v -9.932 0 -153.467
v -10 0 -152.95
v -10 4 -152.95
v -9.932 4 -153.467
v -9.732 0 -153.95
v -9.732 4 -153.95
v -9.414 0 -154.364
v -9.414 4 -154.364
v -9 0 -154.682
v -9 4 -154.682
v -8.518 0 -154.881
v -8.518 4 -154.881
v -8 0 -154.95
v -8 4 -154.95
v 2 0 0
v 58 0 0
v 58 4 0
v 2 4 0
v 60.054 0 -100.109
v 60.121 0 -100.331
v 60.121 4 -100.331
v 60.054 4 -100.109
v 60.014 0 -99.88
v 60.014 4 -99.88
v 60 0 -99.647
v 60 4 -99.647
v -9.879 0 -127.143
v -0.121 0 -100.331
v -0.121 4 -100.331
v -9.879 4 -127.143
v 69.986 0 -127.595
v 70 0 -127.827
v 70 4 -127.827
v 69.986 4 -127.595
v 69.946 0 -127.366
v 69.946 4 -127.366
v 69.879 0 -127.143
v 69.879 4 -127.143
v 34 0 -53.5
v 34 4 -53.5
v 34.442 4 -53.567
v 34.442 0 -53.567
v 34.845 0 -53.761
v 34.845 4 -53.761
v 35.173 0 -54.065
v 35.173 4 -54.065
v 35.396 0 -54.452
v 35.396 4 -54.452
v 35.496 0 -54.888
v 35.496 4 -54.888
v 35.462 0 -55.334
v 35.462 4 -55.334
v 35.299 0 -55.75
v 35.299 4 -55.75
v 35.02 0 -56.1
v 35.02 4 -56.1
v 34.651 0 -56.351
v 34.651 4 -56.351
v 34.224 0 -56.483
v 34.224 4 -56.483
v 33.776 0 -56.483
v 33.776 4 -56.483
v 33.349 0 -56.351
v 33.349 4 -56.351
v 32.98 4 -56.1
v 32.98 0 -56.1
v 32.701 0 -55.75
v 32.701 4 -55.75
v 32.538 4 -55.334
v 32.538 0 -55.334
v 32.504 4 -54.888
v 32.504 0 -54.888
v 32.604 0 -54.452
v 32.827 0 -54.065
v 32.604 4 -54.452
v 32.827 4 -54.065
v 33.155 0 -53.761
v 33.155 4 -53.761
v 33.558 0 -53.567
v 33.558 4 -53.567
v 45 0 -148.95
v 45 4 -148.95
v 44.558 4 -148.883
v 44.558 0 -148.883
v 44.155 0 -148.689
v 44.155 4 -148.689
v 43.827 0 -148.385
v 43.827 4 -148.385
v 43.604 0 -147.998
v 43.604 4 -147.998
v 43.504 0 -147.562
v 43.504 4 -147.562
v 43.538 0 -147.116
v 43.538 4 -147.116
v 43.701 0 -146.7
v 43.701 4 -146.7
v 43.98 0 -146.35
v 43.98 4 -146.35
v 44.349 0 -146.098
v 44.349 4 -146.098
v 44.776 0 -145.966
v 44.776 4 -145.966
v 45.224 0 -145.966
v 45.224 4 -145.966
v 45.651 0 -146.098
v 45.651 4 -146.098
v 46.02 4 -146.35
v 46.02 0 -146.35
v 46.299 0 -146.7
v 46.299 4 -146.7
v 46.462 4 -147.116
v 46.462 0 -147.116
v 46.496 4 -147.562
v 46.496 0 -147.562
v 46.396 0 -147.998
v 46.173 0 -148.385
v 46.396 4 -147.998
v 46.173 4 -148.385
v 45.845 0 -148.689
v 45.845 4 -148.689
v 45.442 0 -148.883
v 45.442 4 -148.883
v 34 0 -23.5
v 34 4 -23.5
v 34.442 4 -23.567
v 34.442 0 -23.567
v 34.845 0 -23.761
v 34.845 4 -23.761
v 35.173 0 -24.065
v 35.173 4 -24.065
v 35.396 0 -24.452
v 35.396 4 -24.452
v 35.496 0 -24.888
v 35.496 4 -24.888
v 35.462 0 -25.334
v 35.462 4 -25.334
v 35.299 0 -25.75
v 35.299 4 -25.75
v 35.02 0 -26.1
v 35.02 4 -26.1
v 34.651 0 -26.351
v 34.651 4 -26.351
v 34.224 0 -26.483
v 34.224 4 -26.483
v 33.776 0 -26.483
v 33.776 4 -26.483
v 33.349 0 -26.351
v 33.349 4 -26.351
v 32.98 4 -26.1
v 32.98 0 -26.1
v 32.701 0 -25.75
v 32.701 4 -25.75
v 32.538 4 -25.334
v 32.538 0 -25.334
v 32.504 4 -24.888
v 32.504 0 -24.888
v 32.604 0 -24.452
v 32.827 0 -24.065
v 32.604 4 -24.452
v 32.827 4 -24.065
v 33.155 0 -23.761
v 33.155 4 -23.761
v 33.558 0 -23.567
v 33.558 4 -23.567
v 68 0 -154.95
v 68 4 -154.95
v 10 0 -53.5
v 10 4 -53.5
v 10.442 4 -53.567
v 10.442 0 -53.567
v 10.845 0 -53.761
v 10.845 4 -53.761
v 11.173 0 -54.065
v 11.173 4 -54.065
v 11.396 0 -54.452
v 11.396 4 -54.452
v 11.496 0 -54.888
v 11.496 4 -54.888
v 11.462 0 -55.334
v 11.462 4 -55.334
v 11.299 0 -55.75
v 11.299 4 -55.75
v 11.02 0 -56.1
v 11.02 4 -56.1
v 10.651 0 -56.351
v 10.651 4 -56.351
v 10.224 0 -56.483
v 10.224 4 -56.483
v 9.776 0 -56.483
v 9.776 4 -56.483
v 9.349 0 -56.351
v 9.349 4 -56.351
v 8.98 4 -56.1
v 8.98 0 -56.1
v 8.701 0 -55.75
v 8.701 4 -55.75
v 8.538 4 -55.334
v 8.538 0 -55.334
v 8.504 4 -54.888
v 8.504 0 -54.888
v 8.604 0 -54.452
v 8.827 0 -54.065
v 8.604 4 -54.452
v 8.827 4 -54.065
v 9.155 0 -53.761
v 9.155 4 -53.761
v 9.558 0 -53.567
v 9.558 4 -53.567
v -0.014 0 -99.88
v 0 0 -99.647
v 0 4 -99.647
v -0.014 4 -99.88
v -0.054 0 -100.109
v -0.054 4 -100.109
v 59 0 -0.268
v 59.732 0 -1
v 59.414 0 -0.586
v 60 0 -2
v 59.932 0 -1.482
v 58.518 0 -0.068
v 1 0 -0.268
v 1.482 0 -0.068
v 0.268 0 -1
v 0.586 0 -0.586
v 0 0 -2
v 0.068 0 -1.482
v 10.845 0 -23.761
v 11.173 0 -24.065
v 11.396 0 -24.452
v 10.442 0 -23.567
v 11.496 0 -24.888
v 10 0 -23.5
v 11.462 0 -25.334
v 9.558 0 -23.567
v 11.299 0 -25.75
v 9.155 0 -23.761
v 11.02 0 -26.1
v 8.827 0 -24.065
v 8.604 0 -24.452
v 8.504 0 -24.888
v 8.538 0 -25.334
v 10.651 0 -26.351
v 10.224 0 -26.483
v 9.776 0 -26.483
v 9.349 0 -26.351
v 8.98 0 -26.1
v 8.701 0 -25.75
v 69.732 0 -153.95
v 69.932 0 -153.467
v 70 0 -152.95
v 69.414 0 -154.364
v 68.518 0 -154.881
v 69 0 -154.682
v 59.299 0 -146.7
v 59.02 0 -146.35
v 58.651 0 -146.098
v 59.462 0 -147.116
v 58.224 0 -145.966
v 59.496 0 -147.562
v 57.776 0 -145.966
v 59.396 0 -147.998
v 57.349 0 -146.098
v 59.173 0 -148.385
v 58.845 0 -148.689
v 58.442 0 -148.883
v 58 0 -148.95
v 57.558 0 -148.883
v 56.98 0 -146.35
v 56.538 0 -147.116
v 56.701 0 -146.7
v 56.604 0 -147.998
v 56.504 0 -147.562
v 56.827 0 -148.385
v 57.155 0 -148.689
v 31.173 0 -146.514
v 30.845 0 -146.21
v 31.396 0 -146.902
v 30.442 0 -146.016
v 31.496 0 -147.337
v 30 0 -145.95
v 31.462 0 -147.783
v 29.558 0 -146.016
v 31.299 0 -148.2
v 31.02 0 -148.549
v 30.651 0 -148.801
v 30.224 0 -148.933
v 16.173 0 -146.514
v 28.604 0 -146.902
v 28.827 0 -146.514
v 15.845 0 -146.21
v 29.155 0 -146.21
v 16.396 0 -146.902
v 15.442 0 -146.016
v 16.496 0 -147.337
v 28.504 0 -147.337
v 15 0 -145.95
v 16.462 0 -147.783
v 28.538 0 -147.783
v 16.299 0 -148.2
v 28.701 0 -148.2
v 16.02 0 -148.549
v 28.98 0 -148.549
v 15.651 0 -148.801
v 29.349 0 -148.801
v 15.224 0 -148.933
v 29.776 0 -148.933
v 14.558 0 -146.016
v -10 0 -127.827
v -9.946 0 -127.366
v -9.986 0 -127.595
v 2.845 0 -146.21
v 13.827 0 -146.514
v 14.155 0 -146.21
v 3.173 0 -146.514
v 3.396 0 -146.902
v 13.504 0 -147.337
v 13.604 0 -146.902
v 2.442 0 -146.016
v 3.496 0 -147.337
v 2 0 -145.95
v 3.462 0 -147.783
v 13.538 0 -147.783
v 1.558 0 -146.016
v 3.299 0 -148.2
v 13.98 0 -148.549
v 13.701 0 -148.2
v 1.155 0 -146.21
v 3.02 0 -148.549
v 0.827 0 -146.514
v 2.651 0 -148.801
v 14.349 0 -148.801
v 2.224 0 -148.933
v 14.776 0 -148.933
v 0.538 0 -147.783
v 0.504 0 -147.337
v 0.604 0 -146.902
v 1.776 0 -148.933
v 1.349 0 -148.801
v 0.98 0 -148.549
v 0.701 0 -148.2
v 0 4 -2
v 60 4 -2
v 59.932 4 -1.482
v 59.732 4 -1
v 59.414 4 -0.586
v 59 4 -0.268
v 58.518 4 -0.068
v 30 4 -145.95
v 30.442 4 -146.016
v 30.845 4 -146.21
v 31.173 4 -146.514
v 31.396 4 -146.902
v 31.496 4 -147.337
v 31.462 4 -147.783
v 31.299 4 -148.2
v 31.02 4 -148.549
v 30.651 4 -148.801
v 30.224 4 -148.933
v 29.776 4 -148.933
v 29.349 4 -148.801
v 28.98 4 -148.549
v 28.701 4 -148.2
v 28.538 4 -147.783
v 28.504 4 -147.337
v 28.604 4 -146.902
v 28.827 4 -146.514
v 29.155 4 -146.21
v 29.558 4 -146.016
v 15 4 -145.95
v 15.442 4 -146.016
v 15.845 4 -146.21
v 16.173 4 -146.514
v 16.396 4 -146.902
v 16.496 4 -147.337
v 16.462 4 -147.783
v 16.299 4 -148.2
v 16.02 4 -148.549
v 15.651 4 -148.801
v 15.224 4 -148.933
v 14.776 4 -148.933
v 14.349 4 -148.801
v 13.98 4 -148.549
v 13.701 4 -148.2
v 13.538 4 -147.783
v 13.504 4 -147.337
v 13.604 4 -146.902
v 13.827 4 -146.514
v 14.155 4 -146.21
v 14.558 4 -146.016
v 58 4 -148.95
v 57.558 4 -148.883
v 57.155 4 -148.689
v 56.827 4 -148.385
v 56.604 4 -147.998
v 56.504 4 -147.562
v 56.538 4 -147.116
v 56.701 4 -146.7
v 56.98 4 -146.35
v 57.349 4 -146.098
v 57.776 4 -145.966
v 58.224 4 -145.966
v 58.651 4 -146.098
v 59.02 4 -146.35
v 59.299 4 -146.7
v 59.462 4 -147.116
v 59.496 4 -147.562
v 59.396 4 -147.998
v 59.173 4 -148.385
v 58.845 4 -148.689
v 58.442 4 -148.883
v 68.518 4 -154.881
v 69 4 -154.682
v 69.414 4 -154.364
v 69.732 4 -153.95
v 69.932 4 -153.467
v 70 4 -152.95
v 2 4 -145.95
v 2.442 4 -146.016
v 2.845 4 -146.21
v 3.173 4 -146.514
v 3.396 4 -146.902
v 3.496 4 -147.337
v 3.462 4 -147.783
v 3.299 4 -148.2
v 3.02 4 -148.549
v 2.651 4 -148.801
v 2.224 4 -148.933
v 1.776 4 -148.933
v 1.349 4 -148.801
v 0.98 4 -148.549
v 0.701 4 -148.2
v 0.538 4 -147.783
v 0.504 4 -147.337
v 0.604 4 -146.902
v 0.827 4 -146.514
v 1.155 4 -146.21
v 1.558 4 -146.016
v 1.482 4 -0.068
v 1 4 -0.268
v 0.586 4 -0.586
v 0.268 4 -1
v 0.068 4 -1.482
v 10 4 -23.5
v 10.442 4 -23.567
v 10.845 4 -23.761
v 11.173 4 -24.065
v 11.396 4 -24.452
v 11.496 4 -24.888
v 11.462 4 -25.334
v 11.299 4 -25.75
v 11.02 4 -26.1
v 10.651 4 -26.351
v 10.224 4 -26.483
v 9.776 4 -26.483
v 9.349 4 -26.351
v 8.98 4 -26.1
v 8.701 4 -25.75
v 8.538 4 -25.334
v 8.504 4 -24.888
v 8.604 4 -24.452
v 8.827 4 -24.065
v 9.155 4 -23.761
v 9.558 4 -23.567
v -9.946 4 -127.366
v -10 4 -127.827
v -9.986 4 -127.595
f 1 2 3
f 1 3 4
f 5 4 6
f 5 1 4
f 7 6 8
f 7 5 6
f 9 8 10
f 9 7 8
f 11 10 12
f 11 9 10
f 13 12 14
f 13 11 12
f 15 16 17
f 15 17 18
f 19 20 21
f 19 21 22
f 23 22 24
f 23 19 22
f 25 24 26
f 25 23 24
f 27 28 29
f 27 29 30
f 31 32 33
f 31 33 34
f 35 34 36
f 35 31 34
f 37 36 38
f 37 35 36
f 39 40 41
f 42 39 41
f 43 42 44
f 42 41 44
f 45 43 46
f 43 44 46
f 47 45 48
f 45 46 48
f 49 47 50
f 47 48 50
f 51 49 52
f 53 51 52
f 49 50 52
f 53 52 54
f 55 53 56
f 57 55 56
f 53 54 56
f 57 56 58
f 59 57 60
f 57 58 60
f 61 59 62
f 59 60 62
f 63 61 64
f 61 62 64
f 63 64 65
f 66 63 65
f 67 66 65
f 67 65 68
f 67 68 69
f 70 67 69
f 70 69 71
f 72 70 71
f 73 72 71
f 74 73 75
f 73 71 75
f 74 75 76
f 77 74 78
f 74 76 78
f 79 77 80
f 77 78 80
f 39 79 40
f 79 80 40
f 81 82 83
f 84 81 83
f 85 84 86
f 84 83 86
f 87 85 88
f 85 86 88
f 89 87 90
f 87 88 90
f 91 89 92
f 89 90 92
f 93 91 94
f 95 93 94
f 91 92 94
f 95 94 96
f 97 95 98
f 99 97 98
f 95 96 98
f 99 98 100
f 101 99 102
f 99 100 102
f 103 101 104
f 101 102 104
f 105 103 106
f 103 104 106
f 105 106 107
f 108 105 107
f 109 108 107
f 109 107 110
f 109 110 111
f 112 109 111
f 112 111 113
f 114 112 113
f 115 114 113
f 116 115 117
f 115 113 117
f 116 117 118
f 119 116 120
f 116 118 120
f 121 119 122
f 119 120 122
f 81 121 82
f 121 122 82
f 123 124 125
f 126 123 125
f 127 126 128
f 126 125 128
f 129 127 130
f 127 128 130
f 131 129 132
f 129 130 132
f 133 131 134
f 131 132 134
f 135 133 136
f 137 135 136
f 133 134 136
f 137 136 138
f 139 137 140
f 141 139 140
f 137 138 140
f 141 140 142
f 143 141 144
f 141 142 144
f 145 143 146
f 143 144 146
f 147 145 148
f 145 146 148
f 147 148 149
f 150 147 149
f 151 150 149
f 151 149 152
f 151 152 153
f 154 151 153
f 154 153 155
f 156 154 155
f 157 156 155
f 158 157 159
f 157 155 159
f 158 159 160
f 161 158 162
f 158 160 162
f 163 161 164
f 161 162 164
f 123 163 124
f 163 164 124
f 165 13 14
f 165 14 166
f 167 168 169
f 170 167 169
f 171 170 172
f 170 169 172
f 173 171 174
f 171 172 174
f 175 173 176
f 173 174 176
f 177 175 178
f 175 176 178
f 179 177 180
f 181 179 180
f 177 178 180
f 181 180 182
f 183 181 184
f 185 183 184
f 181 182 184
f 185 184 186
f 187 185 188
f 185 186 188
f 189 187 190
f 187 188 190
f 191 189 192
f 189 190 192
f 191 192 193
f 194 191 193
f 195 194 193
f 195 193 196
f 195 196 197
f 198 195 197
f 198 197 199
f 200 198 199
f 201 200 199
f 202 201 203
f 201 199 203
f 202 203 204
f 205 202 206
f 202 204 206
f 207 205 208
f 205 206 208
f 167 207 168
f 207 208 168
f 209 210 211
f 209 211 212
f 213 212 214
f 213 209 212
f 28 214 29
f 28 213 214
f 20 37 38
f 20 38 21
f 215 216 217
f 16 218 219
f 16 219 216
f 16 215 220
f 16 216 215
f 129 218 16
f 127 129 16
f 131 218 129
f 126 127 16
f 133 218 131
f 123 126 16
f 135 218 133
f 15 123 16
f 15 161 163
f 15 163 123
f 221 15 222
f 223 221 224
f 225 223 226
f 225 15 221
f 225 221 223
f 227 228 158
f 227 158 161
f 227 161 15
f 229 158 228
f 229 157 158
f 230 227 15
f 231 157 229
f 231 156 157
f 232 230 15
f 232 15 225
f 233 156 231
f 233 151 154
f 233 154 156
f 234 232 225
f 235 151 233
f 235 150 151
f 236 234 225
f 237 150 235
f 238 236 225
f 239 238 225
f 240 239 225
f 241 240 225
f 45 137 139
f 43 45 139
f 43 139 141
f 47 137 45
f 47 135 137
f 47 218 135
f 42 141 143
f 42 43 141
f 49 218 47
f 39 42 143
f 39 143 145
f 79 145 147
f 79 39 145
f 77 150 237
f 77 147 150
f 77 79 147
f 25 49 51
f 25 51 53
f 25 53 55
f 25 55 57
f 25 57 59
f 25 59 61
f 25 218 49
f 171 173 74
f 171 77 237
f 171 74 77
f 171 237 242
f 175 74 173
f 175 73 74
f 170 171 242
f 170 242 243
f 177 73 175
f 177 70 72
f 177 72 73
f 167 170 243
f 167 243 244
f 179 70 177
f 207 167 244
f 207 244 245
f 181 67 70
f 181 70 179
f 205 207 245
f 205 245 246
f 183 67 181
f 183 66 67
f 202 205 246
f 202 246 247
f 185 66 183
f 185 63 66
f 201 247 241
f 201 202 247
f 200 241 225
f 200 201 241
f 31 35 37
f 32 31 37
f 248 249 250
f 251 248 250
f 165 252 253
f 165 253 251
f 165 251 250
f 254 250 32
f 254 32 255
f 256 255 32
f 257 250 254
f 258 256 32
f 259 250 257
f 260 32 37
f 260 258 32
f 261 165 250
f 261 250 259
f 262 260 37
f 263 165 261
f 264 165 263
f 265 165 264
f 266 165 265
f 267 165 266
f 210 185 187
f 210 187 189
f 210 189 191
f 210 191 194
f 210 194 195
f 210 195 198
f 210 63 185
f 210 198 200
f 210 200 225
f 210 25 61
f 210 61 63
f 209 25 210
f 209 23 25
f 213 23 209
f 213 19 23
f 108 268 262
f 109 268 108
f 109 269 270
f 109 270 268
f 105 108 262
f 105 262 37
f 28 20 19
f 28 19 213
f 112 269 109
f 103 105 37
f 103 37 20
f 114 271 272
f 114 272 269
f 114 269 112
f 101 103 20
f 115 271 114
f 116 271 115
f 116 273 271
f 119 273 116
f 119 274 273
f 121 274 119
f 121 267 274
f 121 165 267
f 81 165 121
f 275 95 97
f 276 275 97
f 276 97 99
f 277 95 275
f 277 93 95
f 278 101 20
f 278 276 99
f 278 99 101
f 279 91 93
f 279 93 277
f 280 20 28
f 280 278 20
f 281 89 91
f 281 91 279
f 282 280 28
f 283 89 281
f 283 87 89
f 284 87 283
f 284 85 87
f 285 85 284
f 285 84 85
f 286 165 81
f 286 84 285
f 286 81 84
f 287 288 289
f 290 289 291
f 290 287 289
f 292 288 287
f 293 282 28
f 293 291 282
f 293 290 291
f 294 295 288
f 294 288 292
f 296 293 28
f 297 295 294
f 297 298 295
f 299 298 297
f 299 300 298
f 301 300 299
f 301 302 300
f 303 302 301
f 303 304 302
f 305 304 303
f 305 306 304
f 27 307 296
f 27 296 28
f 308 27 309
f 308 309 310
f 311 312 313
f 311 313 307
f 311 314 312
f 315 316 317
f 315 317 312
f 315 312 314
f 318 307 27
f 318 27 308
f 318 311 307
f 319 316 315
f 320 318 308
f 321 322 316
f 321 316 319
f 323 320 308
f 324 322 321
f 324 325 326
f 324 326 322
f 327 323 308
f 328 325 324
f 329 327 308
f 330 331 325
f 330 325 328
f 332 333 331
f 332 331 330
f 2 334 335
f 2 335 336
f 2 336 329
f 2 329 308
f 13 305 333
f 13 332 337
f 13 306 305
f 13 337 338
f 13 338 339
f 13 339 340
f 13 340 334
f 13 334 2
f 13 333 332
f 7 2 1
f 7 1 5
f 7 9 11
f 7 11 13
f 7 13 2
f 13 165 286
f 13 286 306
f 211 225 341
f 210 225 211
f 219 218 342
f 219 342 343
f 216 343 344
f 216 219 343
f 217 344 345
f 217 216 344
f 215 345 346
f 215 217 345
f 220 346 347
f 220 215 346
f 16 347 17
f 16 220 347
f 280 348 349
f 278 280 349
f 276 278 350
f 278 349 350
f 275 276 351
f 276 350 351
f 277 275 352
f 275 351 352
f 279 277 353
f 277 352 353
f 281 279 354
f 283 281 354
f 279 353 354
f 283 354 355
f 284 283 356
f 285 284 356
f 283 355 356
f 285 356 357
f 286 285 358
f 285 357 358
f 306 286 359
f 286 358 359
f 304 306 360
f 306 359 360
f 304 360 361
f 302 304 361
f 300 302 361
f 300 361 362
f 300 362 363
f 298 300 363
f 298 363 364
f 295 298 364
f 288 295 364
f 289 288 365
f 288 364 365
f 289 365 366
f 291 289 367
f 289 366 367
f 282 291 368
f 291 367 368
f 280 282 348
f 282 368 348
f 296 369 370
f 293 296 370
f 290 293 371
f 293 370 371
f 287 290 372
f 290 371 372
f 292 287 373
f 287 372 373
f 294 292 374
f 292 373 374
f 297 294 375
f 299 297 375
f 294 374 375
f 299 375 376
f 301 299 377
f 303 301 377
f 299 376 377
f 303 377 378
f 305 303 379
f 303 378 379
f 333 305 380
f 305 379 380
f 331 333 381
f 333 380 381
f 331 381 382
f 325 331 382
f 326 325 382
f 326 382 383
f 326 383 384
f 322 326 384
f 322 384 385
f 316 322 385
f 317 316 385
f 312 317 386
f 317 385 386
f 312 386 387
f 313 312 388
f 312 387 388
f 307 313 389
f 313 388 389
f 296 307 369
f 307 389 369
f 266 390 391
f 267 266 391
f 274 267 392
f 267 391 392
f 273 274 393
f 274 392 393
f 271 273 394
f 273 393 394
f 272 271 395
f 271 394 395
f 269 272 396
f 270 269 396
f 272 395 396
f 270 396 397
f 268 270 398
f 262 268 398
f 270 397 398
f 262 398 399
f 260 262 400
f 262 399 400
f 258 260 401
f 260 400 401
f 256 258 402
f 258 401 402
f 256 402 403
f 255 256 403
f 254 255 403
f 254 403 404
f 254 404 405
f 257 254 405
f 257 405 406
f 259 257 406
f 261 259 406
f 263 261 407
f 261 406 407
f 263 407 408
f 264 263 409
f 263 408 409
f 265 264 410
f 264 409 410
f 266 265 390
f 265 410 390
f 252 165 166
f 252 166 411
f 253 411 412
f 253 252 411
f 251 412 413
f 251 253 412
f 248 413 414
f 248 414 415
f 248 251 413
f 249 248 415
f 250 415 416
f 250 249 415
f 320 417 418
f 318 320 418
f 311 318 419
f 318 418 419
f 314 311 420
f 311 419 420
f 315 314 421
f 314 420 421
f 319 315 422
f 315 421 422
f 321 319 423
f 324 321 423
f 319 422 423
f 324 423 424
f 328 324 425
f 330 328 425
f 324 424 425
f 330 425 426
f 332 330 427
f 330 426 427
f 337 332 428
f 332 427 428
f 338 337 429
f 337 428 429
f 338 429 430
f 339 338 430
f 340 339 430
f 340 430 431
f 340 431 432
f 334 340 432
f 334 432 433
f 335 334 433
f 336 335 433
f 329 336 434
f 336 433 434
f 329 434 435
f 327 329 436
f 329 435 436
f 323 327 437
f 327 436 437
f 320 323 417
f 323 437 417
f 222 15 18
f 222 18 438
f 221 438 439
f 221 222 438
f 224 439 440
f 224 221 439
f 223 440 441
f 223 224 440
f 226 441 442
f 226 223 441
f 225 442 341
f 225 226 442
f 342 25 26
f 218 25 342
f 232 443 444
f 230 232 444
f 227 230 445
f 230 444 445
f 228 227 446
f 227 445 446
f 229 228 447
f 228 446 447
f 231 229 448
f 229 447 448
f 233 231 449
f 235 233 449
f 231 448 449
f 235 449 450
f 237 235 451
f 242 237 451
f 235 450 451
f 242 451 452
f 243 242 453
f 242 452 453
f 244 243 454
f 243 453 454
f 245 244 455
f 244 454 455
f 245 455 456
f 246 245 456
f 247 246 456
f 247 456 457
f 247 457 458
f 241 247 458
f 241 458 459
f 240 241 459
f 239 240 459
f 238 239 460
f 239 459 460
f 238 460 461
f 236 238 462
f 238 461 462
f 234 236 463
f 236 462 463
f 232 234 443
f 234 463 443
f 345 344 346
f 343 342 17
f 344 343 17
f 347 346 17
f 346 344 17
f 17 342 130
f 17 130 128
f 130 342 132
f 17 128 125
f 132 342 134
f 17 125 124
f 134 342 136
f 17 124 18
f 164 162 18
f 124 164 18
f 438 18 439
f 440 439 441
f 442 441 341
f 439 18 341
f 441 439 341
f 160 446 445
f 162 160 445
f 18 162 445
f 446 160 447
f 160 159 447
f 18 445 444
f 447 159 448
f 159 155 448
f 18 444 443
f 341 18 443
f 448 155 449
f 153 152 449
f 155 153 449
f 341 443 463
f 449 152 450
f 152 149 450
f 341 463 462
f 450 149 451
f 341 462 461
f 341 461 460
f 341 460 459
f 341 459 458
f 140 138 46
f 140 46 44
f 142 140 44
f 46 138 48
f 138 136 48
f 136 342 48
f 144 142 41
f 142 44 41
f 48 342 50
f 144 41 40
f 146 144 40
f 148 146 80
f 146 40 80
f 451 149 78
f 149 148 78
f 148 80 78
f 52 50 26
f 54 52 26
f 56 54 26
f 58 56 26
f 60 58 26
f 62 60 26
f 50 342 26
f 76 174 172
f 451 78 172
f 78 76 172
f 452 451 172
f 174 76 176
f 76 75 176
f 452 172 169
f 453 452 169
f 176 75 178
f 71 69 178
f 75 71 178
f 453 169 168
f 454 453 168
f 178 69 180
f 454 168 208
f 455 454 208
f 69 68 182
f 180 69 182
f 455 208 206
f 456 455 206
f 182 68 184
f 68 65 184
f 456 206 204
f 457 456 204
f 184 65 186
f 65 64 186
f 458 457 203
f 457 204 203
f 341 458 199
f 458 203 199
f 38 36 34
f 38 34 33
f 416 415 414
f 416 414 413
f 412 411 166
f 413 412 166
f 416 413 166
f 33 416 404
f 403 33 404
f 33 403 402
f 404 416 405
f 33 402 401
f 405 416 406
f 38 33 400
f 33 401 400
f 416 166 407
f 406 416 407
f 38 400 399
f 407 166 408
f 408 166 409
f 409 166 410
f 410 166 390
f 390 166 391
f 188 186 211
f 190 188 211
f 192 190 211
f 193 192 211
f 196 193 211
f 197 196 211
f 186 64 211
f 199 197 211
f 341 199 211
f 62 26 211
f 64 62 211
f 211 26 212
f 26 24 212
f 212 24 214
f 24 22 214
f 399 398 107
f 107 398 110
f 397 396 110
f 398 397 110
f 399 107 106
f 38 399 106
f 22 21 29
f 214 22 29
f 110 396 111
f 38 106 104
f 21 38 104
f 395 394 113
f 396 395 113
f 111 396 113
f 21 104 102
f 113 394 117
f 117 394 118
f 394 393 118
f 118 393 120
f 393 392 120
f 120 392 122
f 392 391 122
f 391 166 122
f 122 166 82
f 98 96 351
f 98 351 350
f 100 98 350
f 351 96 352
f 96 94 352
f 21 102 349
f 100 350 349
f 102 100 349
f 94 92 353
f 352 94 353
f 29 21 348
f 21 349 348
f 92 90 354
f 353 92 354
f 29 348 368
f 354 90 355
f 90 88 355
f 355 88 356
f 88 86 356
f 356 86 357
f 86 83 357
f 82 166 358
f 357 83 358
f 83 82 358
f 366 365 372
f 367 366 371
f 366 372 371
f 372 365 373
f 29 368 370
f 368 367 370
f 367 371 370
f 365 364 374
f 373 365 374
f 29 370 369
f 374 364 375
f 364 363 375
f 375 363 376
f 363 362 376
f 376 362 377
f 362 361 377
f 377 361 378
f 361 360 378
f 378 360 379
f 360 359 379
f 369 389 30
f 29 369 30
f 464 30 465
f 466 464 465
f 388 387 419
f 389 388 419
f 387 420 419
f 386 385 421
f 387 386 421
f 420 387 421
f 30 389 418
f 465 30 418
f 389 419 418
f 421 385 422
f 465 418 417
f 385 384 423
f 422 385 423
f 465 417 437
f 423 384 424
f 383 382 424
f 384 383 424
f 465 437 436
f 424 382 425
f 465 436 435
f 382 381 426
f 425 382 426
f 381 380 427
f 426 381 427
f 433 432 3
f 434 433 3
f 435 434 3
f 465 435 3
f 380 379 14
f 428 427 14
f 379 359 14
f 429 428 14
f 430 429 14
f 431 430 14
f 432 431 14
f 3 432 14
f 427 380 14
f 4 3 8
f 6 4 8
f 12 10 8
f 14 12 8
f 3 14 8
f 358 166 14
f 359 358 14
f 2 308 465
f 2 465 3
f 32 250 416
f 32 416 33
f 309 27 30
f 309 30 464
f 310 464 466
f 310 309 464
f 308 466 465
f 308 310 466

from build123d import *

# Parameters (mm, degrees)
EXTRUDE_1_DEPTH     = 4
SKETCH_2_R          = 1.5
CUT_EXTRUDE_1_DEPTH = 4
SKETCH_3_R          = 1.5
CUT_EXTRUDE_2_DEPTH = 4


with BuildPart() as part:
    # 草图1 → 凸台-拉伸1 (new body)
    with BuildSketch(Plane(origin=(0, 0, 0), x_dir=(1, 0, 0), z_dir=(0, 1, 0))):
        with BuildLine():
            Line((-0.120614758, 100.331386325), (-9.879385242, 127.143387869))
            ThreePointArc((-9.879385242, 127.143387869), (-9.969615506, 127.480131801), (-10, 127.827428156))
            Line((-10, 127.827428156), (-10, 152.949548389))
            ThreePointArc((-10, 152.949548389), (-9.414213562, 154.363761951), (-8, 154.949548389))
            Line((-8, 154.949548389), (68, 154.949548389))
            ThreePointArc((68, 154.949548389), (69.414213562, 154.363761951), (70, 152.949548389))
            Line((70, 152.949548389), (70, 127.827428156))
            ThreePointArc((70, 127.827428156), (69.969615506, 127.480131801), (69.879385242, 127.143387869))
            Line((69.879385242, 127.143387869), (60.120614758, 100.331386325))
            ThreePointArc((60.120614758, 100.331386325), (60.030384494, 99.994642394), (60, 99.647346039))
            Line((60, 99.647346039), (60, 2))
            ThreePointArc((60, 2), (59.414213562, 0.585786438), (58, 0))
            Line((58, 0), (2, 0))
            ThreePointArc((2, 0), (0.585786438, 0.585786438), (0, 2))
            Line((0, 2), (0, 99.647346039))
            ThreePointArc((0, 99.647346039), (-0.030384494, 99.994642394), (-0.120614758, 100.331386325))
        make_face()
    extrude(amount=EXTRUDE_1_DEPTH)

    # 草图2 → 切除-拉伸1 (cut)
    with BuildSketch(Plane(origin=(0, 4, 0), x_dir=(1, 0, 0), z_dir=(0, 1, 0))):
        with Locations(Location((10, 25, 0), (0, 0, 270))):
            Circle(SKETCH_2_R)
        with Locations(Location((34, 25, 0), (0, 0, 270))):
            Circle(SKETCH_2_R)
        with Locations(Location((34, 55, 0), (0, 0, 270))):
            Circle(SKETCH_2_R)
        with Locations(Location((10, 55, 0), (0, 0, 270))):
            Circle(SKETCH_2_R)
    extrude(amount=-CUT_EXTRUDE_1_DEPTH, mode=Mode.SUBTRACT)

    # 草图3 → 切除-拉伸2 (cut)
    with BuildSketch(Plane(origin=(0, 4, 0), x_dir=(1, 0, 0), z_dir=(0, 1, 0))):
        with Locations(Location((2, 147.449548389, 0), (0, 0, 270))):
            Circle(SKETCH_3_R)
        with Locations(Location((15, 147.449548389, 0), (0, 0, 270))):
            Circle(SKETCH_3_R)
        with Locations(Location((45, 147.449548389, 0), (0, 0, 90))):
            Circle(SKETCH_3_R)
        with Locations(Location((58, 147.449548389, 0), (0, 0, 90))):
            Circle(SKETCH_3_R)
        with Locations(Location((30, 147.449548389, 0), (0, 0, 270))):
            Circle(SKETCH_3_R)
    extrude(amount=-CUT_EXTRUDE_2_DEPTH, mode=Mode.SUBTRACT)


solid = part.part
